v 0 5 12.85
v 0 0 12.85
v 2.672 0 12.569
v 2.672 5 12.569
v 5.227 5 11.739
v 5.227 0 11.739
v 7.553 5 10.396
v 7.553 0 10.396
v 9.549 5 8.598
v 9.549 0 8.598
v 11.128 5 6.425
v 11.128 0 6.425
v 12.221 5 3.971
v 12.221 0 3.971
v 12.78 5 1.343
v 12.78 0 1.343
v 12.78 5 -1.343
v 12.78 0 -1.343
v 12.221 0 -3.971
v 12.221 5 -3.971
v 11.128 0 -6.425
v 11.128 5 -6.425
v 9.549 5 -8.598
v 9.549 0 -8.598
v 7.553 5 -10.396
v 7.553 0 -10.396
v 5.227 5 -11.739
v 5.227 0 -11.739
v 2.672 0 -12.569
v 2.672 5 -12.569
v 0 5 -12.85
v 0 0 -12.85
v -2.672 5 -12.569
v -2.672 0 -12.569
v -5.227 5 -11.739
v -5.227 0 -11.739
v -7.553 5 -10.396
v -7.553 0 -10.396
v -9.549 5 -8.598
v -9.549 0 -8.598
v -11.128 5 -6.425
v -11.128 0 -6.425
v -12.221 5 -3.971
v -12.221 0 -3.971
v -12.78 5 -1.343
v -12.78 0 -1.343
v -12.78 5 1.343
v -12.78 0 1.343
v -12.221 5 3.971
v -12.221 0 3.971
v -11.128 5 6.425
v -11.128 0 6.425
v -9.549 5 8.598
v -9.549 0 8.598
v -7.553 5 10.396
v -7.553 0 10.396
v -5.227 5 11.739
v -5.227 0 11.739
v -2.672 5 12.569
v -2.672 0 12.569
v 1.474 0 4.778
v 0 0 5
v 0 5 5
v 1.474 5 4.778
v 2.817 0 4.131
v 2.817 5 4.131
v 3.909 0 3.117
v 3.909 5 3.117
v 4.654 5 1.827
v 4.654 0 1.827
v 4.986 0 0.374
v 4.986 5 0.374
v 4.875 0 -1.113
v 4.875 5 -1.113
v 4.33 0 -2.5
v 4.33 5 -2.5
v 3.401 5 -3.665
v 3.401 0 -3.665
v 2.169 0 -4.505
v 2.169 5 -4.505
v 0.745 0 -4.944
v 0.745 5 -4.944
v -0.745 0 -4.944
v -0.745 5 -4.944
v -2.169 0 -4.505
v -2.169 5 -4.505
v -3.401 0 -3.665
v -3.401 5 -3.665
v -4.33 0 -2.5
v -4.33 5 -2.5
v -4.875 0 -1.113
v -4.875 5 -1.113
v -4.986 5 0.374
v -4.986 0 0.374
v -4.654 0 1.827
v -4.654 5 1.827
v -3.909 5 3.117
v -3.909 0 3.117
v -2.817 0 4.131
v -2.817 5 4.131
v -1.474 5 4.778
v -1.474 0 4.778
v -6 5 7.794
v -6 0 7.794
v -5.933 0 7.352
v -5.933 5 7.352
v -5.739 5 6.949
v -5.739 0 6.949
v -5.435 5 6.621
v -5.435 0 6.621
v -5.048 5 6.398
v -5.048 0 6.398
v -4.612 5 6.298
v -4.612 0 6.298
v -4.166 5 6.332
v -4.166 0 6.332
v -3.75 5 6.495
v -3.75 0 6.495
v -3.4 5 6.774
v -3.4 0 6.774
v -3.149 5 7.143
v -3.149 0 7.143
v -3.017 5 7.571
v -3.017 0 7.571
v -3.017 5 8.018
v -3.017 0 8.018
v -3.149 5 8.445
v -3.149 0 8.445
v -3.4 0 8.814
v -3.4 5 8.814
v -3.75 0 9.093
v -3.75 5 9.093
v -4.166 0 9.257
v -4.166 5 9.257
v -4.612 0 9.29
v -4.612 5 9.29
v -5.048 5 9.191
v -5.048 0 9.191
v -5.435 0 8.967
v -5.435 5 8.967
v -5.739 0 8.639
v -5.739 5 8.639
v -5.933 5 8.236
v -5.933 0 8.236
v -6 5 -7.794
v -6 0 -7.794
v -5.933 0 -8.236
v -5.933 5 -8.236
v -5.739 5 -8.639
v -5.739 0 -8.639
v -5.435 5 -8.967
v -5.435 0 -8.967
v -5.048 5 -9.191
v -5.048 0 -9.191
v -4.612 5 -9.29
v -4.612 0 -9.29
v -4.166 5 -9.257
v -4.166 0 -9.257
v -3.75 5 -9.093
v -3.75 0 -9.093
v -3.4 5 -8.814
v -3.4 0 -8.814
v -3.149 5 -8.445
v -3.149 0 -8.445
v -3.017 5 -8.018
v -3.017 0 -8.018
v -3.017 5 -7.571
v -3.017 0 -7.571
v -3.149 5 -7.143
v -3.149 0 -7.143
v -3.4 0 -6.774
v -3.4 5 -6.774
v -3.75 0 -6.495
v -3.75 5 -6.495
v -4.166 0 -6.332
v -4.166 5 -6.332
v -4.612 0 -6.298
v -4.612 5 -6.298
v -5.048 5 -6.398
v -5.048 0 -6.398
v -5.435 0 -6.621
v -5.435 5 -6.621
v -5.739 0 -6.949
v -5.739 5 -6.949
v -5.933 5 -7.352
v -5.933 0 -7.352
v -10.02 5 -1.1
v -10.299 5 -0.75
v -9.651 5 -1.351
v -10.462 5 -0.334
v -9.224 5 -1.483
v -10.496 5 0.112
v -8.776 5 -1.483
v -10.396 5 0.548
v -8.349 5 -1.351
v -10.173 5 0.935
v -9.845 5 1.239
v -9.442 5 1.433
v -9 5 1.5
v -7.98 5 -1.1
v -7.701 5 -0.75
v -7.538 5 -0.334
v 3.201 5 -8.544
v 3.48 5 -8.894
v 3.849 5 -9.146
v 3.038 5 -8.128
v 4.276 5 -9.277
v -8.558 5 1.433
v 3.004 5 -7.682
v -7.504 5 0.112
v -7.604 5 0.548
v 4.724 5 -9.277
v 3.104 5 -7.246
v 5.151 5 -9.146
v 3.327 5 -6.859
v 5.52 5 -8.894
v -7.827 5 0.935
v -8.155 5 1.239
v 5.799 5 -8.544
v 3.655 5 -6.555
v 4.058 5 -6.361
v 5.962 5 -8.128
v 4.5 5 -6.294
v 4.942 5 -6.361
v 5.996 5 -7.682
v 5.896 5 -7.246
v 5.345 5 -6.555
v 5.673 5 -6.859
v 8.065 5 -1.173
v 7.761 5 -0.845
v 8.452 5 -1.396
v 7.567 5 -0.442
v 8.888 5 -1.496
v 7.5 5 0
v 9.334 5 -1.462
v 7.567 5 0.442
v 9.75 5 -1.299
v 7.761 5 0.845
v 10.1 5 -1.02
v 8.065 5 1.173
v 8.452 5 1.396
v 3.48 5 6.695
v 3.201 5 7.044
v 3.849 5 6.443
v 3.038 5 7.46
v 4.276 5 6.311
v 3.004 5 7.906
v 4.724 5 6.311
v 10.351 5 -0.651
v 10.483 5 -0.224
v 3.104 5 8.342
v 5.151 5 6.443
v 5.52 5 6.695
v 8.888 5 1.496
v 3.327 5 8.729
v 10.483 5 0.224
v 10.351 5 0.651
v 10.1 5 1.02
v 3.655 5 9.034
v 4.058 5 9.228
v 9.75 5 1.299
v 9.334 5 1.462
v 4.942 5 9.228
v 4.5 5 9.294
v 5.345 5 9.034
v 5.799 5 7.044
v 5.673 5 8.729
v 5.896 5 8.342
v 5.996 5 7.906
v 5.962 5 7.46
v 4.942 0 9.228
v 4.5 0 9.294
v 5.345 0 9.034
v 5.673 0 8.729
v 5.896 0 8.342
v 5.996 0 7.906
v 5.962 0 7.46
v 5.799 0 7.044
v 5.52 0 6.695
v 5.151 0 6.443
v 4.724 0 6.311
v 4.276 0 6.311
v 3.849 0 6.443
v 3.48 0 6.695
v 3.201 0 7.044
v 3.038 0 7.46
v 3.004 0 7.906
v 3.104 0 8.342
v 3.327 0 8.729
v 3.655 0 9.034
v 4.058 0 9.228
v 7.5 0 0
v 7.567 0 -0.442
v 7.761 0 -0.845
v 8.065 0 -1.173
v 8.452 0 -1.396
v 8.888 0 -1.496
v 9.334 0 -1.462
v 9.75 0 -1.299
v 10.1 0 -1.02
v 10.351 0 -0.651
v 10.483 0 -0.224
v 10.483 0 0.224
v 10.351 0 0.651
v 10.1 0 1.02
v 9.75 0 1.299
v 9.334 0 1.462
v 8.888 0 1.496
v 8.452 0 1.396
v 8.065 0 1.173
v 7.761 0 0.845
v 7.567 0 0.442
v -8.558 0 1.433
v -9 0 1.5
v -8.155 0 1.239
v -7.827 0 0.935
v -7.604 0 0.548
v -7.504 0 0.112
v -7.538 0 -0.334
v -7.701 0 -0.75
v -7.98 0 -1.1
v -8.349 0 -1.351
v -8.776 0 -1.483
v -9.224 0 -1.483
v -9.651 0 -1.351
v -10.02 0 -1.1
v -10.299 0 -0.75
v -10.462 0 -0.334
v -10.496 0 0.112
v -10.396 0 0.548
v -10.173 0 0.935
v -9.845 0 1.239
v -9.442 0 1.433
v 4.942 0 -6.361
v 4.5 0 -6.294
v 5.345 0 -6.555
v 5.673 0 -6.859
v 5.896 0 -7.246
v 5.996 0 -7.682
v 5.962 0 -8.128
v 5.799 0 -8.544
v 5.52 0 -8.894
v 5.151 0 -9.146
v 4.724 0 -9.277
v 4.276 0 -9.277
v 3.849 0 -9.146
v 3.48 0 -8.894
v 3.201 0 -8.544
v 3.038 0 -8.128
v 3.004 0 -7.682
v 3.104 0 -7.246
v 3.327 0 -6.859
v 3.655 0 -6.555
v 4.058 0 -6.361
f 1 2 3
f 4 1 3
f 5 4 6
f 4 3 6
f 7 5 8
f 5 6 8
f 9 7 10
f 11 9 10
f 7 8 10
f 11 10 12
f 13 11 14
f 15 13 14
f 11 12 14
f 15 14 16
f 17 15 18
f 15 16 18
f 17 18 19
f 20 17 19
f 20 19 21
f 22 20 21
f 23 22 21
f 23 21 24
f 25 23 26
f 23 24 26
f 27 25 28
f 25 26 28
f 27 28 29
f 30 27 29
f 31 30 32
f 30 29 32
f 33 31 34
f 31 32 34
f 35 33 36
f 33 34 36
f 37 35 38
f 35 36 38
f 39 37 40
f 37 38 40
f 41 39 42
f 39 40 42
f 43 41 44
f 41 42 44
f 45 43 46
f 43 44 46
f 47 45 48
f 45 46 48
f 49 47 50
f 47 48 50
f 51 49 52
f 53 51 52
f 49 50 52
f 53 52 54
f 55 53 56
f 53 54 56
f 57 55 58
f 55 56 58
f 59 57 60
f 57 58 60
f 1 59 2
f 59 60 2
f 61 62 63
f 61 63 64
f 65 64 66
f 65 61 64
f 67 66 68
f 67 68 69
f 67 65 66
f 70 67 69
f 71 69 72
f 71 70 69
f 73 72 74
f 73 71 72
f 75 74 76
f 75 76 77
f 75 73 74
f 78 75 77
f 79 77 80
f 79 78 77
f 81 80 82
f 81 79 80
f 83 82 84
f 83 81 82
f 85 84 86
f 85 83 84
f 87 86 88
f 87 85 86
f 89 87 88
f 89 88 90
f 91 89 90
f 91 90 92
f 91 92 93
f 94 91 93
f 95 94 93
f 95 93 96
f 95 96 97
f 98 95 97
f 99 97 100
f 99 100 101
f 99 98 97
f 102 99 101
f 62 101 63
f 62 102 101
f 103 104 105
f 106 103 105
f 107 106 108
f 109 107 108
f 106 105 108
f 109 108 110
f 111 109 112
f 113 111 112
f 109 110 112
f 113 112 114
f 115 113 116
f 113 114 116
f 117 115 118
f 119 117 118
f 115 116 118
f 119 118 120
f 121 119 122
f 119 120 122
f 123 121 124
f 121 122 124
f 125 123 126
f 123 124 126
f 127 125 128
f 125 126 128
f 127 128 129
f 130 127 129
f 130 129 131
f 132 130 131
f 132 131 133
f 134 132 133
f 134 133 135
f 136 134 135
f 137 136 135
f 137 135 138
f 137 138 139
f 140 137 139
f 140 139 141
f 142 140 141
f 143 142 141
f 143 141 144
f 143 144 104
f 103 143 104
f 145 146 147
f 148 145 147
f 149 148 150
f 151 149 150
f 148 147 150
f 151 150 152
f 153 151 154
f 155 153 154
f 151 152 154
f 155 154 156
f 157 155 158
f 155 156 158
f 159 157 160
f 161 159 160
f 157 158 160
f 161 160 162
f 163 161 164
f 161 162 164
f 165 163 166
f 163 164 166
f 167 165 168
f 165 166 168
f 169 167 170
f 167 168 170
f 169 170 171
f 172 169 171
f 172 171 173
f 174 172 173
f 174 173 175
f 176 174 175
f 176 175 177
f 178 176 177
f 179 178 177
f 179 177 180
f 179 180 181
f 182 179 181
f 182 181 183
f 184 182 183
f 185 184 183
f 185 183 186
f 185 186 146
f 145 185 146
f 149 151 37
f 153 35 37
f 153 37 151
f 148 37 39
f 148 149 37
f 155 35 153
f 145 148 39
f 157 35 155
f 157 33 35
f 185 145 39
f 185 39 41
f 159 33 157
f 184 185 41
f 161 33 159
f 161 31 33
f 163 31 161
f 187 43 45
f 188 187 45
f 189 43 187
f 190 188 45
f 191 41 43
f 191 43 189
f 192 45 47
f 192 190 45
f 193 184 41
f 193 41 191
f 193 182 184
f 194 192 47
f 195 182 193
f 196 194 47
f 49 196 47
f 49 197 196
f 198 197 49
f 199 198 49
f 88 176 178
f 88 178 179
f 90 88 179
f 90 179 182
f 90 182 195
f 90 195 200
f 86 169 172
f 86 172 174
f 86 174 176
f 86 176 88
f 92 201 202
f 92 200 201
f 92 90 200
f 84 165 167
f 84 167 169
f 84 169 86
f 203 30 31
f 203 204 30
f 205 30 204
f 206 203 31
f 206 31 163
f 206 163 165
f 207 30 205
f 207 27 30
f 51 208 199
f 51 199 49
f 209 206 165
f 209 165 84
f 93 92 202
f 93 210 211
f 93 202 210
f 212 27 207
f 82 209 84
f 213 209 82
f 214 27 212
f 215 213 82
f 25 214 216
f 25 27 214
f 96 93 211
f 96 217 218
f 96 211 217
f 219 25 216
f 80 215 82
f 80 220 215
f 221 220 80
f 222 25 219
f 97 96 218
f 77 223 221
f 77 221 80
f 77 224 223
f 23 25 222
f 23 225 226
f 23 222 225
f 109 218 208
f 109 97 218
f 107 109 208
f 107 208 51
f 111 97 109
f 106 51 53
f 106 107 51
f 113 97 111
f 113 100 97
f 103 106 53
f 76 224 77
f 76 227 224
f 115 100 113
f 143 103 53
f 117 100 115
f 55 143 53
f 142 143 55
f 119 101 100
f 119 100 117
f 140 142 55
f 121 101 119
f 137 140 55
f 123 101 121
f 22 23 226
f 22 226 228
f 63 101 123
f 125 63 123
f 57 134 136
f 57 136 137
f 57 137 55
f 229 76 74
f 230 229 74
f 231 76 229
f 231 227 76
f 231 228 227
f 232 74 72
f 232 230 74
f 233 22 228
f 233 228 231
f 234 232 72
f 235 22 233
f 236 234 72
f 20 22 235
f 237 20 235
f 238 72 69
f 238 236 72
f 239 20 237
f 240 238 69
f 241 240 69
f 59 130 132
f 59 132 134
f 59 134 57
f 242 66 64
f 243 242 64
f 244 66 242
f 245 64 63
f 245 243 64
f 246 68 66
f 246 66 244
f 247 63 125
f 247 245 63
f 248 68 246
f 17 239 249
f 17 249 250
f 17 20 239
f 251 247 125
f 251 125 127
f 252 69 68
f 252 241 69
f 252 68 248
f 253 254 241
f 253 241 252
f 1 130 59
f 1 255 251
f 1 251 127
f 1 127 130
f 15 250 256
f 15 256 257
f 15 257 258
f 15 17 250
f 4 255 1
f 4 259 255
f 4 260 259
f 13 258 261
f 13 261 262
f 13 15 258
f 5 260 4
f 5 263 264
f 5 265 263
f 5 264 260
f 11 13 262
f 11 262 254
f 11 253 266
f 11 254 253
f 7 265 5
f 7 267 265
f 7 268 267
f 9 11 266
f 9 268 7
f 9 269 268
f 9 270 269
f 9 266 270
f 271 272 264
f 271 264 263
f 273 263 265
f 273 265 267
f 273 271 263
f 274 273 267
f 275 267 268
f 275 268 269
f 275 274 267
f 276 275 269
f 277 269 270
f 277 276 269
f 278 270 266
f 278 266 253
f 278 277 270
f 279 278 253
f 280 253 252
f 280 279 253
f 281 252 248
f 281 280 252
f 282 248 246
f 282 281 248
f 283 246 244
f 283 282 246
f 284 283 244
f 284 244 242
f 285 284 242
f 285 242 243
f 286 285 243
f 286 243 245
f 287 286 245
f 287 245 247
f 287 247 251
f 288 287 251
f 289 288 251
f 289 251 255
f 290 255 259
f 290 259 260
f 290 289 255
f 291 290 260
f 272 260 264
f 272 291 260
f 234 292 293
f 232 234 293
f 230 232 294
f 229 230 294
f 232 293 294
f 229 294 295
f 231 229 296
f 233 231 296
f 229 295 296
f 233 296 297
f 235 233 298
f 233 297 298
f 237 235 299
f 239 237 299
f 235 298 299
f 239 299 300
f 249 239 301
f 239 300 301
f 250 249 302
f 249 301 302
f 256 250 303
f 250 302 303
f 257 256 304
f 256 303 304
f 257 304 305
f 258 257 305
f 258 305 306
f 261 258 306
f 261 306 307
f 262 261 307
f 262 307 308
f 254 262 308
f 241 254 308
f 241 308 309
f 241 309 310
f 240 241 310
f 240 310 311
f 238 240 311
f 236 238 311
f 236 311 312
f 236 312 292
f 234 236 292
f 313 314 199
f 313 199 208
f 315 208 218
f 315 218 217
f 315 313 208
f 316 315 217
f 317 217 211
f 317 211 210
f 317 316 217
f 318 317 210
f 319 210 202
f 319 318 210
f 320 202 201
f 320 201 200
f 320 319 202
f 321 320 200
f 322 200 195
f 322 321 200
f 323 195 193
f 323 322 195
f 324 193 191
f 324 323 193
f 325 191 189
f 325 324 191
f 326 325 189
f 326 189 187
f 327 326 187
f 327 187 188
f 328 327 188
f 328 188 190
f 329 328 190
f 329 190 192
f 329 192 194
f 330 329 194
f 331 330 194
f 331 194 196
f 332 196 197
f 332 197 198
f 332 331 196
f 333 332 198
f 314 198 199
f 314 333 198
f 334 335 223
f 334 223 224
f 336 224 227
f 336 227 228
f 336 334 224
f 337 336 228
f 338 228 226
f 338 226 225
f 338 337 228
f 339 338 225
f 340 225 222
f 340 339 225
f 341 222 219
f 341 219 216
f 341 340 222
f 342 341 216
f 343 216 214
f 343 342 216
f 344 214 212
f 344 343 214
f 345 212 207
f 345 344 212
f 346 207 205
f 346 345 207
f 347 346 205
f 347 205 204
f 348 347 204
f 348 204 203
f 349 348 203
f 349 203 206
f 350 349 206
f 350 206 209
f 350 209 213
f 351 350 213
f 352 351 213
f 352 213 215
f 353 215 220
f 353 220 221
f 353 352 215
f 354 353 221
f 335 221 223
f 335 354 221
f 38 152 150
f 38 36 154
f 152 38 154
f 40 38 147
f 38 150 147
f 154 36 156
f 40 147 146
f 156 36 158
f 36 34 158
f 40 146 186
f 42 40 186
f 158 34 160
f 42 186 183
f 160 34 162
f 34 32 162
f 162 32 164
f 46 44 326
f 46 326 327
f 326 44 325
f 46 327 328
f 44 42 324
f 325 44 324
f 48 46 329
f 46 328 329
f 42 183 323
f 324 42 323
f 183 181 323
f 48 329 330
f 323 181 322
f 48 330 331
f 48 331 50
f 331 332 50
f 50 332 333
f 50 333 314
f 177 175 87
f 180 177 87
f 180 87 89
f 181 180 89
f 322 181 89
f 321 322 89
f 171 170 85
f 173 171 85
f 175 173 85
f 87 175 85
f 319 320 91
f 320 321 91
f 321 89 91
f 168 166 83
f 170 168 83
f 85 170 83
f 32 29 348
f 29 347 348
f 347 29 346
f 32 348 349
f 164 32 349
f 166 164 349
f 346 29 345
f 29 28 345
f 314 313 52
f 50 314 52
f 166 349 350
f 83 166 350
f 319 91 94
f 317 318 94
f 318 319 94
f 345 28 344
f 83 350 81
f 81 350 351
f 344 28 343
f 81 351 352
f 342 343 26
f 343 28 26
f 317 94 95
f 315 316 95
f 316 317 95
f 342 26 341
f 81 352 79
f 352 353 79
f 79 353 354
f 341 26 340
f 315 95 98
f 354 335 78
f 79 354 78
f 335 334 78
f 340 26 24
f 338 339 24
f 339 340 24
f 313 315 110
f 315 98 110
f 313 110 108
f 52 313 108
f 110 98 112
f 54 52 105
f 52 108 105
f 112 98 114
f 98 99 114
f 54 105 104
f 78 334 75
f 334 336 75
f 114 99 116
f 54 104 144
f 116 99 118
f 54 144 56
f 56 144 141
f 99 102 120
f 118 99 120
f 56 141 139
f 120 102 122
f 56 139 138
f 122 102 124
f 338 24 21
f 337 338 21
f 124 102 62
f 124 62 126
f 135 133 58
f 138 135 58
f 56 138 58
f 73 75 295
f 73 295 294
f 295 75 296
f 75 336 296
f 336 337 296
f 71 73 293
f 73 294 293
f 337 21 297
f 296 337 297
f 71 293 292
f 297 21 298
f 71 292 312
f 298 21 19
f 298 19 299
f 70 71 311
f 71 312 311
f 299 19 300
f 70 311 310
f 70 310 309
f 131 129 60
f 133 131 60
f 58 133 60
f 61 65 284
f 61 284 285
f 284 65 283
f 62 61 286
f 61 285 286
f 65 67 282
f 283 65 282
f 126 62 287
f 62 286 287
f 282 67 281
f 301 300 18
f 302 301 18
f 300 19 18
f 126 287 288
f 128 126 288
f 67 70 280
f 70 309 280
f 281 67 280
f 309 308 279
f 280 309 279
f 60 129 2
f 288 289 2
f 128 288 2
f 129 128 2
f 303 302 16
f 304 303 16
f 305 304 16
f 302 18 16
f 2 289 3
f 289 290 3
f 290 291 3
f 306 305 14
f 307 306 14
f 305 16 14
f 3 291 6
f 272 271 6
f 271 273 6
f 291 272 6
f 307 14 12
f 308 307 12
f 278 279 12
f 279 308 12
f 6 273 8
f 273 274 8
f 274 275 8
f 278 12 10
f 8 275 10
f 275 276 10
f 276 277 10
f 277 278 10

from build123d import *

# Parameters (mm, degrees)
SKETCH1_R             = 12.85
SKETCH1_R_2           = 1.5
SKETCH1_R_3           = 5
BOSS_EXTRUDE1_DEPTH   = 5
F_6_0MM_DOWEL_HOLE1_D = 3


with BuildPart() as part:
    # Sketch1 → Boss-Extrude1 (new body)
    with BuildSketch(Plane(origin=(0, 0, 0), x_dir=(1, 0, 0), z_dir=(0, 1, 0))):
        with Locations(Location((0, 0, 0), (0, 0, 270))):
            Circle(SKETCH1_R)
        with Locations(Location((4.5, 7.794228634, 0), (0, 0, 270))):
            Circle(SKETCH1_R_2, mode=Mode.SUBTRACT)
        with Locations(Location((-9, 0, 0), (0, 0, 270))):
            Circle(SKETCH1_R_2, mode=Mode.SUBTRACT)
        with Locations(Location((4.5, -7.794228634, 0), (0, 0, 270))):
            Circle(SKETCH1_R_2, mode=Mode.SUBTRACT)
        with Locations(Location((0, 0, 0), (0, 0, 270))):
            Circle(SKETCH1_R_3, mode=Mode.SUBTRACT)
    extrude(amount=BOSS_EXTRUDE1_DEPTH)

    # Ø6.0mm Dowel Hole1 (through all)
    with Locations(Plane(origin=(0, 5, 0), x_dir=(1, 0, 0), z_dir=(0, 1, 0))):
        with Locations((9, 0), (-4.5, 7.794228634), (-4.5, -7.794228634)):
            Hole(F_6_0MM_DOWEL_HOLE1_D / 2)


solid = part.part
